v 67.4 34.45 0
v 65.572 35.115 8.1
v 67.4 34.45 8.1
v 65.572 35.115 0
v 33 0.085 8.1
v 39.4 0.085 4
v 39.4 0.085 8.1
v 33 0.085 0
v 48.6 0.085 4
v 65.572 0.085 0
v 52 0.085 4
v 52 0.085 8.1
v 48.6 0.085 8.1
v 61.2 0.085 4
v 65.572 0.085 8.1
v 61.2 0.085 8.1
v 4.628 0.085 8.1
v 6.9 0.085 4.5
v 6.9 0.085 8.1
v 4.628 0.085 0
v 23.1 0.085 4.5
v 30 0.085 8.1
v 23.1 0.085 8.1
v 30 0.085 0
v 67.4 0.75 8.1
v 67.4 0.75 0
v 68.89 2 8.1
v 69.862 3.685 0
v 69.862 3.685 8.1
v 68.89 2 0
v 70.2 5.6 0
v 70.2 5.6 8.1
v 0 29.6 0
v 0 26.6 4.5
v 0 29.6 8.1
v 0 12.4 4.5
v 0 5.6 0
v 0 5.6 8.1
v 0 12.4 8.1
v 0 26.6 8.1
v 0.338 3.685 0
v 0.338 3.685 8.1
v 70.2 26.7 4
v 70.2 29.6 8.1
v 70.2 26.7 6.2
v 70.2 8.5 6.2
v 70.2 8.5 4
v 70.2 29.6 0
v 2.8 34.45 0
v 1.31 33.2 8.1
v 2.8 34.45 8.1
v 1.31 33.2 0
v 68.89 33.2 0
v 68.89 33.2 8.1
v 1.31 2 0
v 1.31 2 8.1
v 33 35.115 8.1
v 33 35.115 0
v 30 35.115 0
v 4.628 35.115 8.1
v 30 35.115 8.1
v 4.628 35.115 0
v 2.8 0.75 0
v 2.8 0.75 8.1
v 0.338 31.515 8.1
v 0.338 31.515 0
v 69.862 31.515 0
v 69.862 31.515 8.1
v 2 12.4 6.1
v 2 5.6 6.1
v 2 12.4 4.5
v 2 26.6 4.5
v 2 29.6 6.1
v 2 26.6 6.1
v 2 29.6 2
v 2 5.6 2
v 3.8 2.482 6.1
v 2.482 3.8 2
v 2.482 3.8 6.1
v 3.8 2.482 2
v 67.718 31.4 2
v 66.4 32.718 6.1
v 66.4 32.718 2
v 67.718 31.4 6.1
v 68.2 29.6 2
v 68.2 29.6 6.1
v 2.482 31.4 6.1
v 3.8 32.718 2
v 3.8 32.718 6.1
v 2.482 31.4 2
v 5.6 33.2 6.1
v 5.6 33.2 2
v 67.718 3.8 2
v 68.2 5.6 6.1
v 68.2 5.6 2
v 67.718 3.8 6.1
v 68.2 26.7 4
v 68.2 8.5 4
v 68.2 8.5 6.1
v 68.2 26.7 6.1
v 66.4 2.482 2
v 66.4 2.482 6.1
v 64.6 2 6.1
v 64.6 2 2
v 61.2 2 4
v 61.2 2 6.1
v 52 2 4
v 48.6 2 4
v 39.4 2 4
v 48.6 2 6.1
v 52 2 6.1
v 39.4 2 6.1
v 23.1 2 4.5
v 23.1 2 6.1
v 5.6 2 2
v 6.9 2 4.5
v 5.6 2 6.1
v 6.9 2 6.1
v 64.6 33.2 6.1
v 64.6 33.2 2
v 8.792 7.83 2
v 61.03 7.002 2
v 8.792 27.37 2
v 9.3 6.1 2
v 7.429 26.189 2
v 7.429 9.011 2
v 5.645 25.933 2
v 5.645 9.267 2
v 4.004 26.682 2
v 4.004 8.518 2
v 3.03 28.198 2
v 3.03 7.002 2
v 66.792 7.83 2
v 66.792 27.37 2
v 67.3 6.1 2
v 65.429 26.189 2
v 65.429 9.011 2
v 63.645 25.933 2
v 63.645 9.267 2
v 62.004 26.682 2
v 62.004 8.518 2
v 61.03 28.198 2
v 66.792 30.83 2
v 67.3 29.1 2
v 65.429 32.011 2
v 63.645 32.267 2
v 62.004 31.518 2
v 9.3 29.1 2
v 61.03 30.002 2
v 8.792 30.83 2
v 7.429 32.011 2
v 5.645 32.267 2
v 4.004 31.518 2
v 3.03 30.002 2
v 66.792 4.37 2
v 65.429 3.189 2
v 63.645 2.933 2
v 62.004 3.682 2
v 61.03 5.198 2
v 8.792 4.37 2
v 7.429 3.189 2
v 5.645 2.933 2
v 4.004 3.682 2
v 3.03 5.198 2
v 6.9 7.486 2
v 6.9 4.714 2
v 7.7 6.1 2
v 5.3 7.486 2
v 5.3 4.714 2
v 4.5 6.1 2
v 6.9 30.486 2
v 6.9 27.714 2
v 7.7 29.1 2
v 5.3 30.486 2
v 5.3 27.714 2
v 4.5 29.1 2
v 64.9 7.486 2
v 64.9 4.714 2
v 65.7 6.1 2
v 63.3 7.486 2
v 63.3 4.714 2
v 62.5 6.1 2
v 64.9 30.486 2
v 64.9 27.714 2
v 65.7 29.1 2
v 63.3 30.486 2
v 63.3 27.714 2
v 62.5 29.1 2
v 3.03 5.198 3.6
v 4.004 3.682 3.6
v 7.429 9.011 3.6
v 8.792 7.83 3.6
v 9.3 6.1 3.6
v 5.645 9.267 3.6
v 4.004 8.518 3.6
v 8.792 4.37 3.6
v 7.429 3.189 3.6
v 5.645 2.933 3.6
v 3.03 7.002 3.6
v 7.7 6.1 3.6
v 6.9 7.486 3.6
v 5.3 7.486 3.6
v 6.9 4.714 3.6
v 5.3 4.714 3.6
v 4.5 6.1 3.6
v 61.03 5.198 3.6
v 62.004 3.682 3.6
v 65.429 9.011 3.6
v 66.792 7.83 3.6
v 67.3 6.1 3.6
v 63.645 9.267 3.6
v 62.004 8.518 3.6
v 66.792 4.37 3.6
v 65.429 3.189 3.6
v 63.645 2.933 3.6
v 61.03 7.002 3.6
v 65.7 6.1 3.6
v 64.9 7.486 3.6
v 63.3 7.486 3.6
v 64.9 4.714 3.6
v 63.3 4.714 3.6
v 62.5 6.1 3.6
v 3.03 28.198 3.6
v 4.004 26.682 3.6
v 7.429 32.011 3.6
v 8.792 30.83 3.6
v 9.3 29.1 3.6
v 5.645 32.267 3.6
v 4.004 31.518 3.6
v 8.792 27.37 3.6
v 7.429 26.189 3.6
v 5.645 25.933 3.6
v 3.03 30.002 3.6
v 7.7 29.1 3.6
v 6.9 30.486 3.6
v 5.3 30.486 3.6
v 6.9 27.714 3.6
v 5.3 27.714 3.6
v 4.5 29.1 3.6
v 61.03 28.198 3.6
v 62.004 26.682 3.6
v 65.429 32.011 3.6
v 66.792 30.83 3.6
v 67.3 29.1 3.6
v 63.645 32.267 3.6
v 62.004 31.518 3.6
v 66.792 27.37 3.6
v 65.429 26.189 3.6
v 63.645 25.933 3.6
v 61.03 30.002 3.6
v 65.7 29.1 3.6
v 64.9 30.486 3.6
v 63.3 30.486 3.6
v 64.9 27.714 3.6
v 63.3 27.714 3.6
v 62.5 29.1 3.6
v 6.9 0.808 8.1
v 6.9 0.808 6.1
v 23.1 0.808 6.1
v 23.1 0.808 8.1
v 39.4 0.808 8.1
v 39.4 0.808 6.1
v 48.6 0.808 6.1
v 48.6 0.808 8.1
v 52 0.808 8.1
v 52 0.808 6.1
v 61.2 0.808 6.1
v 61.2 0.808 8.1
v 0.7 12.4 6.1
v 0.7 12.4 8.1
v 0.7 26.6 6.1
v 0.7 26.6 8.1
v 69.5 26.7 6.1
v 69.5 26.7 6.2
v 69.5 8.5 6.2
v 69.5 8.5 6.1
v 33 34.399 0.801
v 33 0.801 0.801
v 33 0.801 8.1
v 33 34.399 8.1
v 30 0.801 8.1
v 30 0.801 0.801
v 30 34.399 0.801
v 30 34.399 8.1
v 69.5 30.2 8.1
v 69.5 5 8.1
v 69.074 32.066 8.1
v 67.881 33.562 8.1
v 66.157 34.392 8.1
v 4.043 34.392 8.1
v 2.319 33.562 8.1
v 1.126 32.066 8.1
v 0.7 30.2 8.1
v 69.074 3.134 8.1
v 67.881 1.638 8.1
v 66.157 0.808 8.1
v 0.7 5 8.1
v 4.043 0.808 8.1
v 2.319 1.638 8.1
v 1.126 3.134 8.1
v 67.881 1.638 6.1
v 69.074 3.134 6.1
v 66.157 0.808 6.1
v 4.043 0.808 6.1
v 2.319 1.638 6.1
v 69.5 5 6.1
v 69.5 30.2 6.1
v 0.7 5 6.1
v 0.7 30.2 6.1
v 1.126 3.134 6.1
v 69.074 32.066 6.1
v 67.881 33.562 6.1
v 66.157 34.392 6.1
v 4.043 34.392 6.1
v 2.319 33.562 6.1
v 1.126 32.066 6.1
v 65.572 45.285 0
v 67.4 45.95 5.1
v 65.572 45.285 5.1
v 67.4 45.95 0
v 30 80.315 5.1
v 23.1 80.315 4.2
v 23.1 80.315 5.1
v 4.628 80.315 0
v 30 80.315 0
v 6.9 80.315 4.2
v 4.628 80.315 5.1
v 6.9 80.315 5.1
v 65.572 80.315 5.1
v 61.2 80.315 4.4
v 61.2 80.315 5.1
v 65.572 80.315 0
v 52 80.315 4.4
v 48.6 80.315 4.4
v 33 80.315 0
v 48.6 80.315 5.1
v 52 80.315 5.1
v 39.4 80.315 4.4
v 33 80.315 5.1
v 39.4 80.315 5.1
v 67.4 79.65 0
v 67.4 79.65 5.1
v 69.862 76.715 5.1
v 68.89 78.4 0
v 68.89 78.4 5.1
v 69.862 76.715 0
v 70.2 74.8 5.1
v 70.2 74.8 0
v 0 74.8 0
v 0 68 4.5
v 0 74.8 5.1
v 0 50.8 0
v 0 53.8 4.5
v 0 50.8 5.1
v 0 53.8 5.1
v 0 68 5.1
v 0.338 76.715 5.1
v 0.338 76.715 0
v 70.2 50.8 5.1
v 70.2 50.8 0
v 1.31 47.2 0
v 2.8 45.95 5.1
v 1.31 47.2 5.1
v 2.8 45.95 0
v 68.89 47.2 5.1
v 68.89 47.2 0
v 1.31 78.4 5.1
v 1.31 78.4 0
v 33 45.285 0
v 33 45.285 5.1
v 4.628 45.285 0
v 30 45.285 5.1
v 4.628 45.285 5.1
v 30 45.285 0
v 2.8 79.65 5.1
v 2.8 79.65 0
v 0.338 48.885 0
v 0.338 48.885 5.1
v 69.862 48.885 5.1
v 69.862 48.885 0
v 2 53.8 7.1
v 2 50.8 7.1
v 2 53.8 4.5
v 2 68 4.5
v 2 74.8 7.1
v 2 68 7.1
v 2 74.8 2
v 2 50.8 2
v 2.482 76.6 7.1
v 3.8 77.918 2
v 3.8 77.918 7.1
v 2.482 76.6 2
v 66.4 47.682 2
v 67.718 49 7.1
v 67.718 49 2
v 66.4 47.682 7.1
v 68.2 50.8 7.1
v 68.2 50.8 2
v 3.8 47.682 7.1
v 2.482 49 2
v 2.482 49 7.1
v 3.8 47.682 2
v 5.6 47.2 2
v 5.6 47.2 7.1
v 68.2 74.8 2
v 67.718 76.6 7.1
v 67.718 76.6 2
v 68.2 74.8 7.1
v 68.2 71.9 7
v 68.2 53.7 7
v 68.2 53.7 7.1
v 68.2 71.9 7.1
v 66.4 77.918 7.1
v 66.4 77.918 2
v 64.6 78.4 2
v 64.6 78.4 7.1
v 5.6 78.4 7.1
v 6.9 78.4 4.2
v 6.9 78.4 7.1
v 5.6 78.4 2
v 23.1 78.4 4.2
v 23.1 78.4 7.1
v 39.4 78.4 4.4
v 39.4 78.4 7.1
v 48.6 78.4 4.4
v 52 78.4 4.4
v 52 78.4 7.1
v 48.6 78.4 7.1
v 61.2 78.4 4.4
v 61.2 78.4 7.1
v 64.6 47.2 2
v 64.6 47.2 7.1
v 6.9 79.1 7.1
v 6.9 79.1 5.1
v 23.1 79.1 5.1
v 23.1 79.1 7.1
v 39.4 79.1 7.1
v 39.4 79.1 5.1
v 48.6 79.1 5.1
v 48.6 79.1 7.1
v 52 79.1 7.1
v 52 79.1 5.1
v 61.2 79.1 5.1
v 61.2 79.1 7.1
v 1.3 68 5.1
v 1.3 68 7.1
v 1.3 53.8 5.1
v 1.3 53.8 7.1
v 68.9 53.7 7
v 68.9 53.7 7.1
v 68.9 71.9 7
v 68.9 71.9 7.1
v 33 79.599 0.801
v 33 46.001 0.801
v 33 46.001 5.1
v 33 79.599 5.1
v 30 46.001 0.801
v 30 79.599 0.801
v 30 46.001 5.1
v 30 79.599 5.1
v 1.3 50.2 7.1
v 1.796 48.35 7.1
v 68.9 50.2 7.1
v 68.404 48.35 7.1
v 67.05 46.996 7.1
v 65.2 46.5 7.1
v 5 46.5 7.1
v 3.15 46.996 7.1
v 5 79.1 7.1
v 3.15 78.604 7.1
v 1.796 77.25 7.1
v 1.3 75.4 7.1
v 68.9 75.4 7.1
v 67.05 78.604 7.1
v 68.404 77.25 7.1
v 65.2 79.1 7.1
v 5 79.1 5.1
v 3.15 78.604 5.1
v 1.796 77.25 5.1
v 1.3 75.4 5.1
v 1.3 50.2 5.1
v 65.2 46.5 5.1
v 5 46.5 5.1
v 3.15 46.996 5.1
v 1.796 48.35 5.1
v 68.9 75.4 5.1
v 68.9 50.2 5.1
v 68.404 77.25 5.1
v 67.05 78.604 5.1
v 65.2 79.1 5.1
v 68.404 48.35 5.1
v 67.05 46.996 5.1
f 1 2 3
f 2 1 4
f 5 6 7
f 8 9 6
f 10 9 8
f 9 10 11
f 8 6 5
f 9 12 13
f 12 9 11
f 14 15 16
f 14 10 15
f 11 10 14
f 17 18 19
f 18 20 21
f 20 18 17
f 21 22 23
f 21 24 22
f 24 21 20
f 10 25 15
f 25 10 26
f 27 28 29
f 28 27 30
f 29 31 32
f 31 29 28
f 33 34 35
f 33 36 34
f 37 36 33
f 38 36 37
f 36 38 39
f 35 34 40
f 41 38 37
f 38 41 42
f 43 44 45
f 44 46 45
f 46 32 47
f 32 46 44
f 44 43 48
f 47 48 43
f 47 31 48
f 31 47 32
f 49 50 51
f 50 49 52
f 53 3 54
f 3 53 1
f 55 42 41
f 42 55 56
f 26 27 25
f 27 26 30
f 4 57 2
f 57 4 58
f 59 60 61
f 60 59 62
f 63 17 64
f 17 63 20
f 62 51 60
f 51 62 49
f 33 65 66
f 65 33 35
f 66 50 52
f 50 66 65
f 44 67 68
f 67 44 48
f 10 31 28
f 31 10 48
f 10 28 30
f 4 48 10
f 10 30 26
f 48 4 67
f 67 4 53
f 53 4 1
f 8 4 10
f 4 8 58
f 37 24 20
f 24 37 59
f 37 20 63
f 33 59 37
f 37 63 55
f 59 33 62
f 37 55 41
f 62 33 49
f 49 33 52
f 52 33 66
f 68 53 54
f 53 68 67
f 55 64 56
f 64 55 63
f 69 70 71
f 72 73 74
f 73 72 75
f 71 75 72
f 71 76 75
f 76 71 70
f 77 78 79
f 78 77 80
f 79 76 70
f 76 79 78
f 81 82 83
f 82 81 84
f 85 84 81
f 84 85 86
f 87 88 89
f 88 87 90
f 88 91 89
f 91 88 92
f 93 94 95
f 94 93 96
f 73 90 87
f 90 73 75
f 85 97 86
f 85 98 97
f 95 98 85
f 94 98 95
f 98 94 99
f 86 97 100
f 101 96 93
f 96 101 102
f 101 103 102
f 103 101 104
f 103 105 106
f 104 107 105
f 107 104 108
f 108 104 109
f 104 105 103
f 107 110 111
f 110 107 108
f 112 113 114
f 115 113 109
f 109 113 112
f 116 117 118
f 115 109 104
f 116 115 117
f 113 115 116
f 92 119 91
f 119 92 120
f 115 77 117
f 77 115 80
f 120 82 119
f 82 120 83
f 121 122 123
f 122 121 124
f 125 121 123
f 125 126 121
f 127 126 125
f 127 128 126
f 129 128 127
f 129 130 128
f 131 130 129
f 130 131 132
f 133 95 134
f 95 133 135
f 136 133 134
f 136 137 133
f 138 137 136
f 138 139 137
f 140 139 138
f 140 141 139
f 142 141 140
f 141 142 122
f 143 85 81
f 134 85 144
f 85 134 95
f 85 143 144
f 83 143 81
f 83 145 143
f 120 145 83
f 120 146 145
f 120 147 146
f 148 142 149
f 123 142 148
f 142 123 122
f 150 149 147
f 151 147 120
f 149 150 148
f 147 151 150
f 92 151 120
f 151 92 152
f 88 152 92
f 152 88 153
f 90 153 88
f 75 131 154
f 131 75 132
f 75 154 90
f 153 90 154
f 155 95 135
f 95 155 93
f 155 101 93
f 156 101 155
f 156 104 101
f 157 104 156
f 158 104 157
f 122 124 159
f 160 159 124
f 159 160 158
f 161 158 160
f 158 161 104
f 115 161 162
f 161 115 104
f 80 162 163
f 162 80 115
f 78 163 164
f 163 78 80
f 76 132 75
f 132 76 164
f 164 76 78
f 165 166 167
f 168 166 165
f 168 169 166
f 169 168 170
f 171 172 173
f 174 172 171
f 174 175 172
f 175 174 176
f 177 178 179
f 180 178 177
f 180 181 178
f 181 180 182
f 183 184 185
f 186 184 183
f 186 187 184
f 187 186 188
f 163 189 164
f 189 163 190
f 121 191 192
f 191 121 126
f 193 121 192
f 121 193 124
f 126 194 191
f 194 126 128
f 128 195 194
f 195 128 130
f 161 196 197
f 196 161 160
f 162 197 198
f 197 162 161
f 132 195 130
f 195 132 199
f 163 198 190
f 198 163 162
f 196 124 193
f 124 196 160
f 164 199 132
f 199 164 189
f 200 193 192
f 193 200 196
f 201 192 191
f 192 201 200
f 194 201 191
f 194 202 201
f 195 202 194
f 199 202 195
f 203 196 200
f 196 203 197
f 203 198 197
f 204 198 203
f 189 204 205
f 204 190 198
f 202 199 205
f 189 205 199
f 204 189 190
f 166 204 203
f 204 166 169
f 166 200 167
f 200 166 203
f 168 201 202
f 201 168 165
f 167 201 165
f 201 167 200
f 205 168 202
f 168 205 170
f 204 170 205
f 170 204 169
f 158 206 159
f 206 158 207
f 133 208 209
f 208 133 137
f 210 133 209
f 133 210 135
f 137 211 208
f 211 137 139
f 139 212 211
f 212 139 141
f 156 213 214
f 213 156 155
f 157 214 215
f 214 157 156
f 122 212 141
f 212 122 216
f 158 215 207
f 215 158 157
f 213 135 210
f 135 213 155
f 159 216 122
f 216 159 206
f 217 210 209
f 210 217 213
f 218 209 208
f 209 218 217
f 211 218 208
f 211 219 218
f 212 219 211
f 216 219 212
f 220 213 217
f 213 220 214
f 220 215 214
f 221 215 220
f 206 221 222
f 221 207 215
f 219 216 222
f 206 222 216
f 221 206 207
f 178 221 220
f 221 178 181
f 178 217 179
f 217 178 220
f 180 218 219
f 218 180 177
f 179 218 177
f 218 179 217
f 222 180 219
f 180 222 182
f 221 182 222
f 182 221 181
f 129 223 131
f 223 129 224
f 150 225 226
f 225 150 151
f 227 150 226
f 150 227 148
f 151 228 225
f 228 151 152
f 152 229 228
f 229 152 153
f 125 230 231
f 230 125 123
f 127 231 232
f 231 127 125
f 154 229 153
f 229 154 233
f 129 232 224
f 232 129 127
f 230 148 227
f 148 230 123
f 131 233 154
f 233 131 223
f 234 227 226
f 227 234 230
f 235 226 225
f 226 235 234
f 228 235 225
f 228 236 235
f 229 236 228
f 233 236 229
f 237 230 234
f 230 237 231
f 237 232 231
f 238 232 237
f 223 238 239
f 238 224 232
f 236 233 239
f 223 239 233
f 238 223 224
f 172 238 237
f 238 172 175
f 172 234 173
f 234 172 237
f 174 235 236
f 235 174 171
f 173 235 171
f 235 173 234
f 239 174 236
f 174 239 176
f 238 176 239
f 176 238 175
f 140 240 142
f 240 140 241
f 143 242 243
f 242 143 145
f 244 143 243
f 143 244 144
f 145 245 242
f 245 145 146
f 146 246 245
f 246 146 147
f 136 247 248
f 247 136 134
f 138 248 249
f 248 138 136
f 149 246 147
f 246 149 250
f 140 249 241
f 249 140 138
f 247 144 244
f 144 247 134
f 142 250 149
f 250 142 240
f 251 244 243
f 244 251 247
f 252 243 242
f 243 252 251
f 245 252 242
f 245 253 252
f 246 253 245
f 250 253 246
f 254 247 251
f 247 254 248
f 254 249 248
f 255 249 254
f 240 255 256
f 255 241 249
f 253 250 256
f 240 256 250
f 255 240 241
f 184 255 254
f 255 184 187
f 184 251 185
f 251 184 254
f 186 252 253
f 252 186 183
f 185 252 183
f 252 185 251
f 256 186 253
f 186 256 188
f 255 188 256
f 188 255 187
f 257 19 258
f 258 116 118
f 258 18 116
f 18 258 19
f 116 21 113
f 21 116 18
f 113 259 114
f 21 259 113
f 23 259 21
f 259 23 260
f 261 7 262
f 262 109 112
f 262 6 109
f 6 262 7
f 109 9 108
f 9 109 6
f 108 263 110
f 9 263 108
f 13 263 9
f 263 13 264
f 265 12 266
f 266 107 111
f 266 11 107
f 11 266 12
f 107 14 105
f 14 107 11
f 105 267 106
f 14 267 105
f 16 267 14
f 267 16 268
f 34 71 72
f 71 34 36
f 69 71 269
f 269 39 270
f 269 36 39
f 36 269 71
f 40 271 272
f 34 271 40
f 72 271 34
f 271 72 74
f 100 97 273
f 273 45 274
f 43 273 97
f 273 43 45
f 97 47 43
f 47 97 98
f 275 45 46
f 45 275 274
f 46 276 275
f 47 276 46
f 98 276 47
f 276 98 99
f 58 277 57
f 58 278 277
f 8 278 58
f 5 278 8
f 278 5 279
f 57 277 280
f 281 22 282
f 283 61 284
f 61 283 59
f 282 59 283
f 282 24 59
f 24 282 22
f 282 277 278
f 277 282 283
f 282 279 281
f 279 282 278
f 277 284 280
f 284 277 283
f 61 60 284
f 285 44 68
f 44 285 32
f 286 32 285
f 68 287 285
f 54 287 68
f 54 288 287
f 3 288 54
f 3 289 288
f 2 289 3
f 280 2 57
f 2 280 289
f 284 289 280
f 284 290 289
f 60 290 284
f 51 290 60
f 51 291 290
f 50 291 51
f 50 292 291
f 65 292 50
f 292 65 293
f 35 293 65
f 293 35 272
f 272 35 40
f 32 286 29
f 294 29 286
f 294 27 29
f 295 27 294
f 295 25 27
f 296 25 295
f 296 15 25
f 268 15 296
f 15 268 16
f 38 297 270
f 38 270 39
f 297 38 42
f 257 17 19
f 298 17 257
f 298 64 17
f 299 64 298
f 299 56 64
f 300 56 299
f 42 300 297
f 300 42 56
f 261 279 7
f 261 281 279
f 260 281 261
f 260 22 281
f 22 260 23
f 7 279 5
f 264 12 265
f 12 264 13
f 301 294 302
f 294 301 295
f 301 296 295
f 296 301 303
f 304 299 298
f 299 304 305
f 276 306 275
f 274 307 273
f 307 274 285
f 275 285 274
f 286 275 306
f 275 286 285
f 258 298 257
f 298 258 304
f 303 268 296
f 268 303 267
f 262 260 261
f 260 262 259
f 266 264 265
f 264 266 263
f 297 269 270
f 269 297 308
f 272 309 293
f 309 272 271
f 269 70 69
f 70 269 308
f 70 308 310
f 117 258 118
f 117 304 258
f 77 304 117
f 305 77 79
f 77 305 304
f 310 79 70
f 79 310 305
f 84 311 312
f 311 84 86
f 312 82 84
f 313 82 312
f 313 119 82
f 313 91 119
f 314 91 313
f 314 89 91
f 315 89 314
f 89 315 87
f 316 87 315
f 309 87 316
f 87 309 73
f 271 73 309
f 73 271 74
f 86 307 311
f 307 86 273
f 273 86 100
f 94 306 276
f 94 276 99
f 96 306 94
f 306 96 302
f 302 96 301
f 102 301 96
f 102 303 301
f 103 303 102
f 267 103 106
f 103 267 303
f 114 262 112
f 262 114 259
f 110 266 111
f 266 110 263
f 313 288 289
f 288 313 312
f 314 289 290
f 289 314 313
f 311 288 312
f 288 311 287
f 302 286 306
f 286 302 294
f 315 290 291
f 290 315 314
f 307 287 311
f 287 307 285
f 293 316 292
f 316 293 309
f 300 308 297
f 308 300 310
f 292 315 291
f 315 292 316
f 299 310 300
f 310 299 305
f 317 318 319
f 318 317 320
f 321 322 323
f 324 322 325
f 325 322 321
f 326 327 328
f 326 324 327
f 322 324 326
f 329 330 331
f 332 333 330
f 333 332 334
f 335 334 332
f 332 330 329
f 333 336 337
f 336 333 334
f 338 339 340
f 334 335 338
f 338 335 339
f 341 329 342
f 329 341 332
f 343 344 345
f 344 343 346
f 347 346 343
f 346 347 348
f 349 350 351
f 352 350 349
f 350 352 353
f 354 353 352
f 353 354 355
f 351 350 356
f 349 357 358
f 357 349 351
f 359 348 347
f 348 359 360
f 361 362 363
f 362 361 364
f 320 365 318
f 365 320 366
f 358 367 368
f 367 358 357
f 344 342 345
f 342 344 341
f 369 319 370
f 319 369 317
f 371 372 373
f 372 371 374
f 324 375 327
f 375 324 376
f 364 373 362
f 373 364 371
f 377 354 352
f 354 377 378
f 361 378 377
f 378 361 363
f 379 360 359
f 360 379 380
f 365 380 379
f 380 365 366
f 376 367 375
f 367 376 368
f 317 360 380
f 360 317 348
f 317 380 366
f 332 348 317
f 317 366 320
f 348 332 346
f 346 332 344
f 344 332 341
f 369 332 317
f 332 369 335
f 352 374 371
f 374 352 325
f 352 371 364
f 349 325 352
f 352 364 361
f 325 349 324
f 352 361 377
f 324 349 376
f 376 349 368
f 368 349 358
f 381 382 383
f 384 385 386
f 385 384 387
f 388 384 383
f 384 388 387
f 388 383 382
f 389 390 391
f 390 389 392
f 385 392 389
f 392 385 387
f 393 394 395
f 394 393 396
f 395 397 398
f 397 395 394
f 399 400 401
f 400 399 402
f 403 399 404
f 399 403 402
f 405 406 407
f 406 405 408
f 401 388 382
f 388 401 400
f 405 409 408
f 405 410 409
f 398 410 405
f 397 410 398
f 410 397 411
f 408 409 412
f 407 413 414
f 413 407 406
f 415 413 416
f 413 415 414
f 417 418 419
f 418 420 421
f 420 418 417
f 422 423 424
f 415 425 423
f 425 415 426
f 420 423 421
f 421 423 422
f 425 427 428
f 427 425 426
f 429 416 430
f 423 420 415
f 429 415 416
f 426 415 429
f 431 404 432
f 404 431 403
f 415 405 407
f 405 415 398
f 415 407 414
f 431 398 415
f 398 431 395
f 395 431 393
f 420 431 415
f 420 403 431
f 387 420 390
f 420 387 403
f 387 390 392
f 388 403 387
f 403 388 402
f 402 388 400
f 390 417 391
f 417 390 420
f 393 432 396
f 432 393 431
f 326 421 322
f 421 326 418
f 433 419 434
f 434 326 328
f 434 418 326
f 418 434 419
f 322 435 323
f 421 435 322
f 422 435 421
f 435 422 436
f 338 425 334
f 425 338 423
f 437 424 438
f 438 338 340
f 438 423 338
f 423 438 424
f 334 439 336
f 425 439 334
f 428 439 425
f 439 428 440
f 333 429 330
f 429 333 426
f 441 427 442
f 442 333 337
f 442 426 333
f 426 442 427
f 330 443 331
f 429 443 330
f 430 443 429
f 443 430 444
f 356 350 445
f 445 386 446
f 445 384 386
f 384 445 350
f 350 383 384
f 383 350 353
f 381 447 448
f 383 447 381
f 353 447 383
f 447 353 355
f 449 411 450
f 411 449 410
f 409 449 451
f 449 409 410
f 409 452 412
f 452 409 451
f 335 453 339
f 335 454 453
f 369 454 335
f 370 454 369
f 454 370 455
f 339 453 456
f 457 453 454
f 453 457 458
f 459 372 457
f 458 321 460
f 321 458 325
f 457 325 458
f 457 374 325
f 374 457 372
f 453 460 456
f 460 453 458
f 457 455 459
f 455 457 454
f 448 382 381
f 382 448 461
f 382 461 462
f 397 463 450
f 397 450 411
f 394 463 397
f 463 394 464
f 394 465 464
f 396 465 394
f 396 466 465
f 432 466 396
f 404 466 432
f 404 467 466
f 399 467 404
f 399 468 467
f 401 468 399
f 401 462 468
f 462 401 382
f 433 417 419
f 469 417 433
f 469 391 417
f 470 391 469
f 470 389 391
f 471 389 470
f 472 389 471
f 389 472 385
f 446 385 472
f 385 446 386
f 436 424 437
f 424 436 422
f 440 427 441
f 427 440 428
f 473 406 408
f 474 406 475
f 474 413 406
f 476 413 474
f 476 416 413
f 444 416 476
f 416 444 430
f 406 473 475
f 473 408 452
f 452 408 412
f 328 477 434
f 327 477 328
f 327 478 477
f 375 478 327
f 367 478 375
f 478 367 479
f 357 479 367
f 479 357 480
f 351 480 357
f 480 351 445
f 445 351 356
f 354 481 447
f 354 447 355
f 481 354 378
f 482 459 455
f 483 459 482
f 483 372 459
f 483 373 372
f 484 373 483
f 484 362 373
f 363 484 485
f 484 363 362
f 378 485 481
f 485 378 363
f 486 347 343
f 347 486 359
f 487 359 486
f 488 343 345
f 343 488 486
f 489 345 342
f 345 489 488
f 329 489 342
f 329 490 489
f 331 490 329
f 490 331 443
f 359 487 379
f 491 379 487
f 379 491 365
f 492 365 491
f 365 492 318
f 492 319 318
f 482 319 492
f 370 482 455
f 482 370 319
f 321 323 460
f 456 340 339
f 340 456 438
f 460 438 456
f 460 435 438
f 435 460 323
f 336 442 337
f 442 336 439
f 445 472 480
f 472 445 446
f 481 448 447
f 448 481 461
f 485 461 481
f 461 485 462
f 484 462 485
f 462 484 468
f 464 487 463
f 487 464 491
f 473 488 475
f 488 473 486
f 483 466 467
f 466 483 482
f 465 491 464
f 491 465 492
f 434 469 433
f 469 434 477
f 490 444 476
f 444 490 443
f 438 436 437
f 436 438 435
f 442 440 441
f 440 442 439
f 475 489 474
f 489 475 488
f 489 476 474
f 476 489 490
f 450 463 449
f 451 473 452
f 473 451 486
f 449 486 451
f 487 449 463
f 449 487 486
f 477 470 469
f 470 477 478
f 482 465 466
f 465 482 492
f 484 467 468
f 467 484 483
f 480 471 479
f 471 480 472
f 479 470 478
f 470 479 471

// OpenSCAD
// file: lib_metric_sizes.scad
m2   = 2.8;
m2_5 = 3.2;
m3   = 3.6;
m4   = 4.8;
m5   = 5.6;
m6   = 6.4;
// file: lib_nuts.scad
include <lib_metric_sizes.scad>

m2_nut = [5.2, 1.7];
m3_nut = [6.8, 2.3];
m4_nut = [8.4, 2.8];

m2_flat_nut = [5.2, 2.0];
m3_flat_nut = [6.8, 2.0];
m4_flat_nut = [8.4, 2.0];

//m2_nylon_nut = [, ];
//m2_5_nylon_nut = [, ];
//m3_nylon_nut = [, ];
m4_nylon_nut = [8.4, 3.3];
m5_nylon_nut = [10.0, 4.0];
m6_nylon_nut = [12.4, 5.0];
// file: lib_self_tapping_screws.scad
include <lib_metric_sizes.scad>

m3_st_roundhead = [7.2, 2.0];
m3_st_flathead = [7.2, 0];
// file: lib_machine_screws.scad
include <lib_metric_sizes.scad>

m2x12_shaft = [m2, 12.0];
m2x19_shaft = [m2, 19.0];
m3x12_shaft = [m3, 12.0];
m3x17_shaft = [m3, 17.0];
m3x19_shaft = [m3, 19.0];
m4x12_shaft = [m4, 12.0];
m4x25_shaft = [m4, 25.0];

m2_roundhead = [4.0, 1.0];
m3_roundhead = [5.6, 1.7];
m4_roundhead = [7.2, 2.3];

m2_flathead = [4.0, 1.0];
m3_flathead = [5.6, 1.0];
m4_flathead = [7.2, 1.0];
// file: lib_gadgets.scad
include <lib_machine_screws.scad>
include <lib_self_tapping_screws.scad>
include <lib_nuts.scad>

module stud(shaft, self_tapping=false)
{
	ds = self_tapping ? shaft[0]-0.4 : shaft[0];
	
	cylinder(h=shaft[1], d=ds);
}

module bolt(head, shaft, countersink=false, self_tapping=false) {
	ds = self_tapping ? shaft[0]-0.4 : shaft[0];
	
	cylinder(h=head[1], d=head[0]);
	cylinder(h=shaft[1]+head[1], d=ds);
	if (countersink == true) {
		translate([0, 0, head[1]]) {
			cylinder(h=head[0], d1=head[0], d2=0);
		}
	}
}

module nut(head, countersink=false) {
	cylinder(h=head[1], d=head[0], $fn=6);
	if (countersink == true) {
		translate([0, 0, head[1]]) {
			cylinder(h=head[0], d1=head[0], d2=0, $fn=6);
		}
	}
}

module post(pos, radius, height) {
	translate([pos[0], pos[1], 0]) { 
		cylinder(h=height, r=radius); 
	}
}

module spacer(pos, outer_r, inner_r, height) {
	translate([pos[0], pos[1], 0]) { 
		difference() {
			cylinder(h=height, r=outer_r); 
			if (inner_r > 0) {
				cylinder(h=height+0.0001, r=inner_r); 
			}
		}
	}
}

module grid(size, xx, yy) {
	if (size > 0) {
		for (x = [0 : size : xx] ) {
			translate([x, 0, 0]) cube([0.8, yy, 0.4]);
		}
		for (y = [0 : size : yy] ) {
			translate([0, y, 0]) cube([xx, 0.8, 0.4]);
		}
	}
}
// file: lib_soft.scad
/** 
 * An OpenSCAD library for creating shapes with rounded edges
 *
 * @author Paul Generes <paul.generes@gmail.com>
 * @example soft_example.scad
 */
 
module soft_cube(size=[1, 1, 1], center=false, cr=1) {
	tr = [cr, cr, cr];

    translate(tr) {
        minkowski() {
            sphere(cr);
            cube([size[0]-2*cr, size[1]-2*cr, size[2]-2*cr], center);
        }
    }
}

module softxyz_cube(size=1, center=false, cr=[1, 1, 1]) {
	tr = cr;

    translate(tr) {
        minkowski() {
			scale(cr) {
				sphere(1);
			}
            cube([size[0]-2*cr[0], size[1]-2*cr[1], size[2]-2*cr[2]], center);
        }
    }
}

module softz_cube(size=1, center=false, cr=1) {
	tr = [cr, cr, 0];

    translate(tr) {
        minkowski() {
			cylinder(h=0.00001, r=cr);
			cube([size[0]-2*cr, size[1]-2*cr, size[2]-0.00001], center);
        }
    }
}
// main file
// Raspberry Pi Zero and Zero W

include <lib_enclosure3.scad>

// Variables
//$fn=30;
function fillet_z() = 3.0;
function wall_thickness() = 2.0;
function tolerance() = 0.6; 
function device_x() = 65.0;
function device_y() = 30.0;
function pcb_z() = 1.5;
function device_z() = 7;// 10.4;
function friction() = wall_thickness();
function spacing() = 10.0;
function riser_z() = 1;
function riser_thickness() = 0;
function split() = wall_thickness()+triser_z()+pcb_z()+3.0;



// Right Side
csi   = [
  [device_y()/2, pcb_z()], 
  [17.0, 1]
];

// Left Side
sdcard = [
  [30-16.9, pcb_z()+1.5], 
  [13.0, 3]
];

// Front Side
hdmi  = [
  [12.4, pcb_z()+(3.3)/2], 
  [15.0, 3.3]
];
usb = [
  [41.4, pcb_z()-0.5+(3.6)/2], 
  [8.0, 3.6]
];
power = [
  [54, pcb_z()-0.5+(3.6)/2], 
  [8.0, 3.6]
];



enclosure();

module right_cutouts() {
	square_cutout(csi[0], csi[1]); // camera
}

module left_cutouts() {
	//square_cutout(leds[0],   leds[1]); // pwr & act leds
	square_cutout(sdcard[0], sdcard[1]); // micro sd card
}

module front_cutouts(is_bottom) {
	square_cutout(hdmi[0],  hdmi[1]); // hdmi
    square_cutout(usb[0],  usb[1]); // usb1
    square_cutout(power[0],  power[1]); // usb2
}

module back_cutouts() {
}

module top_cutouts() {
}

module bottom_cutouts() {
	//vent([device_x()/2, device_y()/2], [device_x()-15, device_y()-15], 3.5);
}

module cutouts() {
	rubber_band_grooves();
	//rubber_feet(3.5);
	//flat_head_screws(1.6+wall_thickness());
	//pan_head_screws(3.2);
	//nuts(3.2);
	engraving();
	//port_labels();
}

module rubber_band_grooves() {
	rubber_band_y(3.0, 0.8, 30);
}

module rubber_feet(radius) {
	bottom_face() {
		translate([        10,         10, 0]) cylinder(h=0.8, r=radius);
		translate([        10, inner_y-10, 0]) cylinder(h=0.8, r=radius);
		translate([inner_x-10,         10, 0]) cylinder(h=0.8, r=radius);
		translate([inner_x-10, inner_y-10, 0]) cylinder(h=0.8, r=radius);
	}
}

module flat_head_screws(radius) {
	bottom_face() {
		translate([ 3.5,  3.5, 0]) cylinder(h=wall_thickness(), r1=radius, r2=radius-wall_thickness());
		translate([61.5,  3.5, 0]) cylinder(h=wall_thickness(), r1=radius, r2=radius-wall_thickness());
		translate([ 3.5, 26.5, 0]) cylinder(h=wall_thickness(), r1=radius, r2=radius-wall_thickness());
		translate([61.5, 26.5, 0]) cylinder(h=wall_thickness(), r1=radius, r2=radius-wall_thickness());
    }
}

module pan_head_screws(radius) {
	bottom_face() {
//		translate([ 3.5,  3.5, 0]) cylinder(h=wall_thickness()/2, r=radius);
//		translate([61.5,  3.5, 0]) cylinder(h=wall_thickness()/2, r=radius);
//		translate([ 3.5, 52.5, 0]) cylinder(h=wall_thickness()/2, r=radius);
//		translate([61.5, 52.5, 0]) cylinder(h=wall_thickness()/2, r=radius);
//		translate([ 3.5,  3.5, 0]) cylinder(h=wall_thickness(), r=1.6);
//		translate([61.5,  3.5, 0]) cylinder(h=wall_thickness(), r=1.6);
//		translate([ 3.5, 52.5, 0]) cylinder(h=wall_thickness(), r=1.6);
//		translate([61.5, 52.5, 0]) cylinder(h=wall_thickness(), r=1.6);
	}
}

module nuts(radius) {
	bottom_face() {
//		translate([ 3.5,  3.5, 0]) cylinder(h=wall_thickness()/2, r=radius, $fn=6);
//		translate([61.5,  3.5, 0]) cylinder(h=wall_thickness()/2, r=radius, $fn=6);
//		translate([ 3.5, 52.5, 0]) cylinder(h=wall_thickness()/2, r=radius, $fn=6);
//		translate([61.5, 52.5, 0]) cylinder(h=wall_thickness()/2, r=radius, $fn=6);
//		translate([ 3.5,  3.5, 0]) cylinder(h=wall_thickness(), r=1.6);
//		translate([61.5,  3.5, 0]) cylinder(h=wall_thickness(), r=1.6);
//		translate([ 3.5, 52.5, 0]) cylinder(h=wall_thickness(), r=1.6);
//		translate([61.5, 52.5, 0]) cylinder(h=wall_thickness(), r=1.6);
	}
}

module engraving() {
	*top_face() 
		translate([inner_x()/2, outer_y()/2, 0]) 
			linear_extrude(1) 
				rotate([0, 0, 0])
					text(text="Pi Zero", halign="center", valign="center");
}

module attachments() {
	// Put a thin (hopefully translucent) layer over the pwr & act leds.
	*left_face() 
        translate([leds[0][0]-leds[1][0]/2-0.5, leds[0][1]-leds[1][1]/2-0.5, 0])
            cube([leds[1][0]+1.0, leds[1][1]+1.0, 0.5]);
}

module stand_offs() {
	stand_off([ 3.5,  3.5], 3.2, 1.6);
	stand_off([61.5,  3.5], 3.2, 1.6);
	stand_off([ 3.5, 26.5], 3.2, 1.6);
	stand_off([61.5, 26.5], 3.2, 1.6);
}

module port_labels() {
	front_face() {
		translate([power[0][0], -riser_z(), 0]) 
			linear_extrude(0.8) 
				text(text="PWR", halign="center", valign="bottom", size=2.5);
		translate([hdmi[0][0], -riser_z(), 0]) 
			linear_extrude(0.8) 
				text(text="HDMI", halign="center", valign="bottom", size=2.5);
		translate([av[0][0], -riser_z(), 0]) 
			linear_extrude(0.8) 
				text(text="A/V", halign="center", valign="bottom", size=2.5);
	}	
	right_face() {
		translate([usb[0][0], -riser_z(), 0]) 
			linear_extrude(0.8) 
				text(text="USB", halign="center", valign="bottom", size=2.5);
	}
	bottom_face() {
		translate([2*wall_thickness(), sdcard[0][0], 0]) 
			linear_extrude(0.4) 
                rotate([0, 180, 90])
                    text(text="SD CARD", halign="center", valign="bottom", size=2.5);
	}
}

module final_attachments(is_bottom) {
	*if (!is_bottom) {
		stand_on([ 3.5,  3.5], 3.2, 1.6);
		stand_on([61.5,  3.5], 3.2, 1.6);
		stand_on([ 3.5, 26.5], 3.2, 1.6);
		stand_on([61.5, 26.5], 3.2, 1.6);
    }
}
